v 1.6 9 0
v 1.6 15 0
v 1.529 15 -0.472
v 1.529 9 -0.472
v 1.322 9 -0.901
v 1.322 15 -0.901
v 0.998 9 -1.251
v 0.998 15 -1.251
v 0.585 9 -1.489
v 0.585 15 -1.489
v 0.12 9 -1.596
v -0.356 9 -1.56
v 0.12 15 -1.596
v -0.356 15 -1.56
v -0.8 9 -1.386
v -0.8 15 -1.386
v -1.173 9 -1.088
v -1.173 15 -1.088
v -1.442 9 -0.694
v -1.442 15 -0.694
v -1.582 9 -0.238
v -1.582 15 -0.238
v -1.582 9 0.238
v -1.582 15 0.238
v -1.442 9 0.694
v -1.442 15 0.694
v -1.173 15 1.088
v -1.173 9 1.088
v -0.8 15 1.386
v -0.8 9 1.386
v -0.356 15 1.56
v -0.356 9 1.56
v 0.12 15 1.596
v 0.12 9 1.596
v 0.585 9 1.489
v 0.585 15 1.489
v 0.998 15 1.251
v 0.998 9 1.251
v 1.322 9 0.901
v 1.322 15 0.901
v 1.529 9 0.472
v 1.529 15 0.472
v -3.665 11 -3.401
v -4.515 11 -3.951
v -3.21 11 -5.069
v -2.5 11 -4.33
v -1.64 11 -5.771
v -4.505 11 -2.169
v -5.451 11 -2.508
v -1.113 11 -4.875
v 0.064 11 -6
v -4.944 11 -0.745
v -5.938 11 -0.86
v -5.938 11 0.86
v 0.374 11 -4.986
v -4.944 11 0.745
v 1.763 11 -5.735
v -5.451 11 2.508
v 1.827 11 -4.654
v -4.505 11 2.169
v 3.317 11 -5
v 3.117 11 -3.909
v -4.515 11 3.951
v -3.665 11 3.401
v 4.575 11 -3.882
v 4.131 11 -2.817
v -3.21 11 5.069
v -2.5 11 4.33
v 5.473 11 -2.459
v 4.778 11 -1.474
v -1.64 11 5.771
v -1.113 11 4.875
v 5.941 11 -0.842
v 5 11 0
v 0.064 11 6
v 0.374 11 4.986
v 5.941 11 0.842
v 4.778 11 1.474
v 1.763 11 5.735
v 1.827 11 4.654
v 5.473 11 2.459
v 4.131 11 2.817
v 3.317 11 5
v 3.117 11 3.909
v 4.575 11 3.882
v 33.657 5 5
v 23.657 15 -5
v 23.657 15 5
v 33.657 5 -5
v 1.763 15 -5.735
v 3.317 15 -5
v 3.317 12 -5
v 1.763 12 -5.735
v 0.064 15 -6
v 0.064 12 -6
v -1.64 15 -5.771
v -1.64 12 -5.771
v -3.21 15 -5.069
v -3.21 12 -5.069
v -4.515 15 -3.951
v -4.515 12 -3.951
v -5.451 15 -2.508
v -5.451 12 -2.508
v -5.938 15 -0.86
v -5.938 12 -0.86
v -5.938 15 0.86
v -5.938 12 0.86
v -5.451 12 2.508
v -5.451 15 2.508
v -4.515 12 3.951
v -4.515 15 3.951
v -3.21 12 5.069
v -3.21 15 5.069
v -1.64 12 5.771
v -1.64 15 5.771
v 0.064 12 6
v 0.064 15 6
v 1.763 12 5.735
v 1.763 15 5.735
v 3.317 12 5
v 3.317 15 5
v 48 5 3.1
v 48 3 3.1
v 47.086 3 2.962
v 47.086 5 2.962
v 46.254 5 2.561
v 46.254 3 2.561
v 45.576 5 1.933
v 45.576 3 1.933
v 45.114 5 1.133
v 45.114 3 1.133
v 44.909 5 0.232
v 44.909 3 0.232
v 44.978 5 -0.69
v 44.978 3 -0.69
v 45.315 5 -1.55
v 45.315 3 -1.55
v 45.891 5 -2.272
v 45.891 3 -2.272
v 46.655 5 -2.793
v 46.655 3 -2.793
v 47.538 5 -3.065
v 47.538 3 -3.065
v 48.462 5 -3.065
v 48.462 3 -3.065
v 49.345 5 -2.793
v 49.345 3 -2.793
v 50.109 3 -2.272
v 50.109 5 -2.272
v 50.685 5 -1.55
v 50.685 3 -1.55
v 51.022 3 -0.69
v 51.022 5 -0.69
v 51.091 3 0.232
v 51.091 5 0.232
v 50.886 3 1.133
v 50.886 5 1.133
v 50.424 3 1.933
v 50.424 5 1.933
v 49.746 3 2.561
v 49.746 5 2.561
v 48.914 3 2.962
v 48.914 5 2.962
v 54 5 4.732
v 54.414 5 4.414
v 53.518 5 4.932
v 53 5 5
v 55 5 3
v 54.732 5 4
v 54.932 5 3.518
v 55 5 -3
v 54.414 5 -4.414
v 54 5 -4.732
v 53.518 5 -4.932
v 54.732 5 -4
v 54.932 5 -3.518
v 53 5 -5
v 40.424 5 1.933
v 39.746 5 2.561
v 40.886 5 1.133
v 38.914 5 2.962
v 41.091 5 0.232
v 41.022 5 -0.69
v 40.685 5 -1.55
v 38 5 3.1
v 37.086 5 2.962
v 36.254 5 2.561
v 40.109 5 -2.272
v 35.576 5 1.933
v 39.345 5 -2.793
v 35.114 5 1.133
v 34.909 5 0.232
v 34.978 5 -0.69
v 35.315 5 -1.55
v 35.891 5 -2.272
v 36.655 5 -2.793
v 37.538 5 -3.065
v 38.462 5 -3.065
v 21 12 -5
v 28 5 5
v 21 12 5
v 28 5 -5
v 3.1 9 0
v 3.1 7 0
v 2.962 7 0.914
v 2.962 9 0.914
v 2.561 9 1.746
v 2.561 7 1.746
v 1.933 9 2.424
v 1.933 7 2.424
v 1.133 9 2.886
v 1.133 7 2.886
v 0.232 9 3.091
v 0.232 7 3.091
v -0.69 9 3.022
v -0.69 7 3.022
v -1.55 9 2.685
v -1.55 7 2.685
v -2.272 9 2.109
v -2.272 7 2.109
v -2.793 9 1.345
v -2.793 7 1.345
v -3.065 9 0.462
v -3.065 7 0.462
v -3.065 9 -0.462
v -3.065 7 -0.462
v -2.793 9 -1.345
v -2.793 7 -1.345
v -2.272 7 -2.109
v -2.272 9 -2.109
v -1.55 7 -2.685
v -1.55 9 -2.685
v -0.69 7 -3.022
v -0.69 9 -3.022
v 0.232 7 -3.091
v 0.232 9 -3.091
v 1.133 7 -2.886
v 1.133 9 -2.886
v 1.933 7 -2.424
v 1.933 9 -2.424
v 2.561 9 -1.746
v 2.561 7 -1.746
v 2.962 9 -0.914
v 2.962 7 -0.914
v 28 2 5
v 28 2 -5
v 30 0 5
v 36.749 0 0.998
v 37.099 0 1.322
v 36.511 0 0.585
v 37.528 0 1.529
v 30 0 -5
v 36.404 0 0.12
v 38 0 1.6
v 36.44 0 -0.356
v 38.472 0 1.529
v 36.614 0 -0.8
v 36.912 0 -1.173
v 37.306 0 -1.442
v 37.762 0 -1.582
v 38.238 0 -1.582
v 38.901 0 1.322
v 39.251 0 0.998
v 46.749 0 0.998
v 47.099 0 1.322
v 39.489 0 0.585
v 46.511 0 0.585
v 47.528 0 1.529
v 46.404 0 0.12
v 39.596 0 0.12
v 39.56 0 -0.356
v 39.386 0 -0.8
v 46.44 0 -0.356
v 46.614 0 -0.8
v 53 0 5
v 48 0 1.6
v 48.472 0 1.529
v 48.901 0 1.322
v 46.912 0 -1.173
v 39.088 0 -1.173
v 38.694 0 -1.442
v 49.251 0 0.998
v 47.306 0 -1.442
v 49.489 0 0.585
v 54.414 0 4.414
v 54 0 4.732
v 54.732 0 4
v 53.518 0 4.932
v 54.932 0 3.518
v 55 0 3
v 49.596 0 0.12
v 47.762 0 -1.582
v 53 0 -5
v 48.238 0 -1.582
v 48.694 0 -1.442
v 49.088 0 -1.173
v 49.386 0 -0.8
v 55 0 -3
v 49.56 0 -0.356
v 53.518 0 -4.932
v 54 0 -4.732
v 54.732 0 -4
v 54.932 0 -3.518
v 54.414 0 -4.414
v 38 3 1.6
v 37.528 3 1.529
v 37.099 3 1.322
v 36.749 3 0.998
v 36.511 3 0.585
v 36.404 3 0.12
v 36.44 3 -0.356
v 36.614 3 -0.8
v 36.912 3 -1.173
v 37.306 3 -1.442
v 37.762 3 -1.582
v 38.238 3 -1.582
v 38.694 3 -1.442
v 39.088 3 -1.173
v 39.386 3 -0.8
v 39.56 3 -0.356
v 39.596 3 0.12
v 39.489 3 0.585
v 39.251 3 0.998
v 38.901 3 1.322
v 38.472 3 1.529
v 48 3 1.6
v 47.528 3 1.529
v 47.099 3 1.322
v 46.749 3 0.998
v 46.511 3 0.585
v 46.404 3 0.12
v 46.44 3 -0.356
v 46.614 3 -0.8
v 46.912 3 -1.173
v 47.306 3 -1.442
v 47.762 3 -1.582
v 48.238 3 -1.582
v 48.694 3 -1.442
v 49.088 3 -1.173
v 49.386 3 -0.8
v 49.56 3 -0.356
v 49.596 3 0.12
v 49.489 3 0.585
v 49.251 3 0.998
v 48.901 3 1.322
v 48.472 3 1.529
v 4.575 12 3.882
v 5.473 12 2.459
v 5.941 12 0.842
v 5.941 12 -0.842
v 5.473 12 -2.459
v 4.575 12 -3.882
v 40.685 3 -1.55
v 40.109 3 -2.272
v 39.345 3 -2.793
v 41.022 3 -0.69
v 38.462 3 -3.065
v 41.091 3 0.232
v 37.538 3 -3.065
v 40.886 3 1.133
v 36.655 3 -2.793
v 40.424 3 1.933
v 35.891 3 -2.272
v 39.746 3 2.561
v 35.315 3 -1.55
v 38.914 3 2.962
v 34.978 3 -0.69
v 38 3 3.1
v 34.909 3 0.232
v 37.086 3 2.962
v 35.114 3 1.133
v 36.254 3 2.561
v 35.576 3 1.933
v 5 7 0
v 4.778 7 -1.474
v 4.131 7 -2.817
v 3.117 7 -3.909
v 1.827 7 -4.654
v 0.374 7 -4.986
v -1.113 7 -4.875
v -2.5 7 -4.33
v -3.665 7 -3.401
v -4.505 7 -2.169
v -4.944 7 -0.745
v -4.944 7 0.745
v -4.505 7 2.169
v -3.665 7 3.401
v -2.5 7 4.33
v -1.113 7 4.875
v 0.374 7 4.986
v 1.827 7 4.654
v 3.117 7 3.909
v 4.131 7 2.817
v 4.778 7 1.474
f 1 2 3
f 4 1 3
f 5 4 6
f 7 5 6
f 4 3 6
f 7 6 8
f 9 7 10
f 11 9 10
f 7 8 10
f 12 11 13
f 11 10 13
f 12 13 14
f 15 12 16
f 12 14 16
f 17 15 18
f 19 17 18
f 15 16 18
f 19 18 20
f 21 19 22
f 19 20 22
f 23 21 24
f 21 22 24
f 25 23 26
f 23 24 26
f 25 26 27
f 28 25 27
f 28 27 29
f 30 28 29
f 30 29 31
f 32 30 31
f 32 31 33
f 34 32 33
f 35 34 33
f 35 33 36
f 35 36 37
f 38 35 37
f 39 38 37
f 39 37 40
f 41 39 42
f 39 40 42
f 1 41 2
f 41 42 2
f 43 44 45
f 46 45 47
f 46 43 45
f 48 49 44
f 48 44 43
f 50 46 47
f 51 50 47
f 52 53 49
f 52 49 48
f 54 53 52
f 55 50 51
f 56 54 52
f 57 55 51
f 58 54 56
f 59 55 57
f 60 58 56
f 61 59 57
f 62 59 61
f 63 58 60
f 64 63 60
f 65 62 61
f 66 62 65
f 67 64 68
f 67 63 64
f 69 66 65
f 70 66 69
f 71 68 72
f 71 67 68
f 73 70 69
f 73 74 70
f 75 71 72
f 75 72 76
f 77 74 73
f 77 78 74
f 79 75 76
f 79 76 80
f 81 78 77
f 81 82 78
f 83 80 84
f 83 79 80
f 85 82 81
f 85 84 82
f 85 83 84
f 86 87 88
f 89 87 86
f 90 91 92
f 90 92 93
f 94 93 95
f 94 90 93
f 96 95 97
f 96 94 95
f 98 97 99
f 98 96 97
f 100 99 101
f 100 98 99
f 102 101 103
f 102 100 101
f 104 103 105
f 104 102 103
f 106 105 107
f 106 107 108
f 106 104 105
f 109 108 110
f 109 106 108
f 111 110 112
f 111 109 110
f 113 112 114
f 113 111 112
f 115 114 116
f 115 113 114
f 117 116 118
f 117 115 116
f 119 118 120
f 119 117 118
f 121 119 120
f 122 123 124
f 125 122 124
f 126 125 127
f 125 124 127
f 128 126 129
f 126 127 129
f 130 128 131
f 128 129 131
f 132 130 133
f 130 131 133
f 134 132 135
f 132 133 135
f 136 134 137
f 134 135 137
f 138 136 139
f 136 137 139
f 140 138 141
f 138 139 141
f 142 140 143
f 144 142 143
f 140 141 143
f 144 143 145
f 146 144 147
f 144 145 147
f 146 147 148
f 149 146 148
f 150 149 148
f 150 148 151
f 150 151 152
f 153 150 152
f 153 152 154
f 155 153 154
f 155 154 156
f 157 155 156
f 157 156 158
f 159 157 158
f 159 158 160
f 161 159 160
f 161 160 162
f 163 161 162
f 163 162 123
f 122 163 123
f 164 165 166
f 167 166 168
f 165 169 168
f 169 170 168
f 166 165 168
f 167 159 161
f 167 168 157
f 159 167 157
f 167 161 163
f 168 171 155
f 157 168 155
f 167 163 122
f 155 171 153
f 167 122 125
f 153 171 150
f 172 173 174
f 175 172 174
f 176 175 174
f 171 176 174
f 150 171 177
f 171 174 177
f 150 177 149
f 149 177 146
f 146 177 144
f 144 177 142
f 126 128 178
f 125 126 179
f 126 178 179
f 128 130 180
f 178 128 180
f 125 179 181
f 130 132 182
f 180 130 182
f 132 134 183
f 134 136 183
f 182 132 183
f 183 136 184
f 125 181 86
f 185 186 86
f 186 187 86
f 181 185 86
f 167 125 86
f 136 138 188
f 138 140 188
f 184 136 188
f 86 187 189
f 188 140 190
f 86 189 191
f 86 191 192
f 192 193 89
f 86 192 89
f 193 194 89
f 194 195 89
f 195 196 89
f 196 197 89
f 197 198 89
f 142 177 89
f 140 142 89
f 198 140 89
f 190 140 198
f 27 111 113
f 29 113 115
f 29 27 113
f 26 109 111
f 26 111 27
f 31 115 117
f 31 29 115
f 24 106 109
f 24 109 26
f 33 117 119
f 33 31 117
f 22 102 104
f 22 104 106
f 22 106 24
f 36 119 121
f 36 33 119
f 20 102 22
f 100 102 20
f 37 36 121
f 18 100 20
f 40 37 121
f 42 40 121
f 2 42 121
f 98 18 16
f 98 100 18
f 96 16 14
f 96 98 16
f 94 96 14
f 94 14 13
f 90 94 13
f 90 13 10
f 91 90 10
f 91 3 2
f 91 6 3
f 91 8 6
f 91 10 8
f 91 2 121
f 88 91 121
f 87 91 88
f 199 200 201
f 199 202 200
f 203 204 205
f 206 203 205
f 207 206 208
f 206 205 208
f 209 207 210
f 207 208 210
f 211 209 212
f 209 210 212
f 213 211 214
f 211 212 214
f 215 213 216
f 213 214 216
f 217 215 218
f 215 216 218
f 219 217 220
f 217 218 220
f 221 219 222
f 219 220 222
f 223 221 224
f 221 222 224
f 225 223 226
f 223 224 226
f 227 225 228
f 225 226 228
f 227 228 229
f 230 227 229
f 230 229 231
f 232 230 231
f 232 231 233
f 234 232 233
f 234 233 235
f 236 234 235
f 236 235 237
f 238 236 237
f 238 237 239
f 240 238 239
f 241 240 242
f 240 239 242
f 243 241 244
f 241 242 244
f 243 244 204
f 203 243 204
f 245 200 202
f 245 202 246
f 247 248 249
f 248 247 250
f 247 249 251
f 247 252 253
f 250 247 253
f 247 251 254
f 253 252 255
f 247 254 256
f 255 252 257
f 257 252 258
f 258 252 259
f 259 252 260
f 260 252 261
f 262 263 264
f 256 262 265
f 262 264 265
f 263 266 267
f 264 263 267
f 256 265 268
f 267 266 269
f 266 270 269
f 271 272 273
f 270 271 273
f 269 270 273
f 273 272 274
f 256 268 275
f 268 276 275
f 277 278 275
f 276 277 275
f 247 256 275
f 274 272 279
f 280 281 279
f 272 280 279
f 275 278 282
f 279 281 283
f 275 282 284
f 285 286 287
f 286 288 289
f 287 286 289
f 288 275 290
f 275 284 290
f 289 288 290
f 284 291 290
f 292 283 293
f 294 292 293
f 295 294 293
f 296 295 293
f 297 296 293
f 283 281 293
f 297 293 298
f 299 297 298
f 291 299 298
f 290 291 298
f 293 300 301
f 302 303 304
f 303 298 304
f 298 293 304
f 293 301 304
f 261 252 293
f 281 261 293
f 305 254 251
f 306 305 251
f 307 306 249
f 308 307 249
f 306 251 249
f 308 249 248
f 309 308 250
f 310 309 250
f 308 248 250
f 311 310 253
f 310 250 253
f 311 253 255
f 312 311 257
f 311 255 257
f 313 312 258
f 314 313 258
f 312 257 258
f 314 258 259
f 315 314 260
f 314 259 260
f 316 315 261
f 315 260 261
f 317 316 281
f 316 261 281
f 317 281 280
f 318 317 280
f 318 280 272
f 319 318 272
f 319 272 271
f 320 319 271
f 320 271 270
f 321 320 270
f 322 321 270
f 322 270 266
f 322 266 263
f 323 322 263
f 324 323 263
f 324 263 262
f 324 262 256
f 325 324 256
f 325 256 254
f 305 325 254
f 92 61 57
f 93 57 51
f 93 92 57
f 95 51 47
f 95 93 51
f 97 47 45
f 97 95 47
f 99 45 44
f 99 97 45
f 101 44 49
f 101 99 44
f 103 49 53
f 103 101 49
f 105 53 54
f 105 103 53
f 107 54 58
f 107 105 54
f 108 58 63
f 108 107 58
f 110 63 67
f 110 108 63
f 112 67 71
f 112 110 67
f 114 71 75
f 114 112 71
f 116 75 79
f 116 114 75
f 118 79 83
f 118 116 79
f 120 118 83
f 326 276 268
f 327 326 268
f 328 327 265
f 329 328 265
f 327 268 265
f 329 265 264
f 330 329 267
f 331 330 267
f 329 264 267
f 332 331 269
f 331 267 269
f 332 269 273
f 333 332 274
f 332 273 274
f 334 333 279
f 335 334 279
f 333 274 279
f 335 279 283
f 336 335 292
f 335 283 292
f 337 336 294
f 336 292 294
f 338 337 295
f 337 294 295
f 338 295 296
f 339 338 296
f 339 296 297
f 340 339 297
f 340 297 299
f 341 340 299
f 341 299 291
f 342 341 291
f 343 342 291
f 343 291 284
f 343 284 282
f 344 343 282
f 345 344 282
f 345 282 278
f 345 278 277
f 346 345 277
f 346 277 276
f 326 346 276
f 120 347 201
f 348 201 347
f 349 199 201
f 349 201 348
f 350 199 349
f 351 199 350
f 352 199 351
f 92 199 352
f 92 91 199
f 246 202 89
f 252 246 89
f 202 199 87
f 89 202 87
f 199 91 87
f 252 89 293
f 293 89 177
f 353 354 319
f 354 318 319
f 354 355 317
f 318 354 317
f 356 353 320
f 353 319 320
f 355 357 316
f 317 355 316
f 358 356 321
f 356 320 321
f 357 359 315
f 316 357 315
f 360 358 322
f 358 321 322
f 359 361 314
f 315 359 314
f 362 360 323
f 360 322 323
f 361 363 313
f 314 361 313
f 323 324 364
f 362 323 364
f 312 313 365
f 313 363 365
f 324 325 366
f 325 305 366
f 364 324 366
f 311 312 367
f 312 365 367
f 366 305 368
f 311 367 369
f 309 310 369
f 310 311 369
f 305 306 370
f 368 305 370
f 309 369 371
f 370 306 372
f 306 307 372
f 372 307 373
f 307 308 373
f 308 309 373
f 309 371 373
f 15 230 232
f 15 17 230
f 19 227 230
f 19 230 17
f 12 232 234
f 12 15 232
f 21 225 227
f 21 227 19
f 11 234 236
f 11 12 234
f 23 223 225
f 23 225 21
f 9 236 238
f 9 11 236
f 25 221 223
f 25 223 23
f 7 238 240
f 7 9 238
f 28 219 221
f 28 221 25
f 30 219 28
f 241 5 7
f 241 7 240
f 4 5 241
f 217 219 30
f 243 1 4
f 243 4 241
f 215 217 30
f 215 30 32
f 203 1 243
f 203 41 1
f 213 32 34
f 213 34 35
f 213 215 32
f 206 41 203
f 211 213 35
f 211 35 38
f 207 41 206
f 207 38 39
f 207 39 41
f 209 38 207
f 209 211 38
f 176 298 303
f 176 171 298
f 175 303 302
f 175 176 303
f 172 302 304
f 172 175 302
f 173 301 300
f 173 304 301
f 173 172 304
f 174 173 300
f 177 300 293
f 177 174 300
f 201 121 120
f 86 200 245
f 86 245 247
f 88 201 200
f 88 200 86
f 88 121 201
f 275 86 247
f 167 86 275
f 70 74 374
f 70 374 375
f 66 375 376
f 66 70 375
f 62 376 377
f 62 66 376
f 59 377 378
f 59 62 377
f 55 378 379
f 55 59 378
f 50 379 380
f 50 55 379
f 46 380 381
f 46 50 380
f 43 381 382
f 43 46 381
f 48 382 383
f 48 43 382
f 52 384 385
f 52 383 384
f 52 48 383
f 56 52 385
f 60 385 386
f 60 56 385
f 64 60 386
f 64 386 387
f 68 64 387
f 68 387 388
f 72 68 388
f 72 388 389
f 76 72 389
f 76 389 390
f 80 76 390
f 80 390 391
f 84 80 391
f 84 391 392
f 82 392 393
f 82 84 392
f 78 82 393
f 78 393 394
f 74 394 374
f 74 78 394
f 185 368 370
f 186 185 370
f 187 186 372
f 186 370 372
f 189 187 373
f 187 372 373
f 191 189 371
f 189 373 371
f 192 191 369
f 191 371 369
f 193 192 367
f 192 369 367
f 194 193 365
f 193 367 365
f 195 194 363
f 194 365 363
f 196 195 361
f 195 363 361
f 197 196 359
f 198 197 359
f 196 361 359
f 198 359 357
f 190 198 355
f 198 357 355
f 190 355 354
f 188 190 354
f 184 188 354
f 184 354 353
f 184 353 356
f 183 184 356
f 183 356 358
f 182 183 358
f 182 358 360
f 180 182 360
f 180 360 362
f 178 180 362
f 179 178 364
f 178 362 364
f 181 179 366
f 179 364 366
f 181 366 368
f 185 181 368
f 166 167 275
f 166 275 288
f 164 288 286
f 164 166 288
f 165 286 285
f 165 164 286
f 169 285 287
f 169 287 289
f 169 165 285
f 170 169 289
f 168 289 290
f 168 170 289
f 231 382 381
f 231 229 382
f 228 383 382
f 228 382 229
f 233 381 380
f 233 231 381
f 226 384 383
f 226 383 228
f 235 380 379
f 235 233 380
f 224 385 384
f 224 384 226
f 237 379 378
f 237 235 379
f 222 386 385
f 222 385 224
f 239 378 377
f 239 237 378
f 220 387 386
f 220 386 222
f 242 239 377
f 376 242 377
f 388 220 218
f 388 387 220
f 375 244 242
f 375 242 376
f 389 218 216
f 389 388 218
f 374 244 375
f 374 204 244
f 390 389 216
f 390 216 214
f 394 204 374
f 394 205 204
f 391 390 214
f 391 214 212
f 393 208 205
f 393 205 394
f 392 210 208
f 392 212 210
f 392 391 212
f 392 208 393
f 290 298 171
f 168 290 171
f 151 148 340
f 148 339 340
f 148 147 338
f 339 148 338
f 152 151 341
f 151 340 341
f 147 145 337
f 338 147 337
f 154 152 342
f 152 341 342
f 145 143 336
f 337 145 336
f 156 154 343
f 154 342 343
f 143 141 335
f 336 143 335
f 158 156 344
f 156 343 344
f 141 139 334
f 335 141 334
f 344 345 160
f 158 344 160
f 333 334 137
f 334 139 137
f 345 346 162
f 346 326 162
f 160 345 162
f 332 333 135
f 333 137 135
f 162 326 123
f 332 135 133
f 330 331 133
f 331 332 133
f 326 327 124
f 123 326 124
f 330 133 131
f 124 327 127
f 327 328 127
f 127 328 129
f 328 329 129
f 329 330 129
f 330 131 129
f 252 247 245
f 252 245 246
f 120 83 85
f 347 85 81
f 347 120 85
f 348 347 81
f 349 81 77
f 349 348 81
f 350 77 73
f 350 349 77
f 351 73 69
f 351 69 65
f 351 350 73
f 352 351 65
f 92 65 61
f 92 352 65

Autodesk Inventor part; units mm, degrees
ref_plane "YZ Plane" through (0, 0, 0) normal (1, 0, 0) x (0, 1, 0)
ref_plane "XZ Plane" through (0, 0, 0) normal (0, 1, 0) x (-1, 0, 0)
ref_plane "XY Plane" through (0, 0, 0) normal (0, 0, 1) x (1, 0, 0)
sketch "Sketch1" plane through (0, 0, 0) normal (0, 0, 1) x (1, 0, 0)
  line L0 (0, 0) -> (0, 15)
  line L1 (0, 15) -> (23.6569, 15)
  line L2 (21, 12) -> (0, 12)
  line L3 (0, 12) -> (0, 15)
  line L4 (28, 0) -> (55, 0)
  line L5 (55, 0) -> (55, 5)
  line L6 (55, 5) -> (28, 5)
  line L7 (28, 5) -> (28, 0)
  line L8 (28, 5) -> (21, 12)
  line L9 (23.6569, 15) -> (33.6569, 5)
  dimension "d0" = 135
  dimension "d1" = 5
  dimension "d2" = 28
  dimension "d3" = 3
  dimension "d4" = 4
  dimension "d5" = 12
  dimension "d6" = 55
extrude "Extrusion1" add sketch "Sketch1" along normal mid plane 10
sketch "Sketch3" plane through (33.6569, 5, 5) normal (0, 1, 0) x (1, 0, 0)
  line L0 (21.3431, 10) -> (21.3431, 0) projected
  line L1 (21.3431, 5) -> (-0.1629, 5) construction
  line L2 (-33.6569, 0) -> (-33.6569, 10) projected
  point P0 (-33.6569, 5)
  point P1 (14.3431, 5)
  point P2 (4.3431, 5)
  dimension "d9" = 10
  dimension "d18" = 38
hole "Hole1" at (48, 5, 0) at (38, 5, 0) direction (0, -1, 0) diameter 3.2 end through all counterbore diameter 6.2 counterbore depth 2
chamfer "Chamfer1" distance 2 angle 45 1 edges at (28, 0, 0)
sketch "Sketch4" plane through (0, 15, 5) normal (0, 1, 0) x (1, 0, 0)
  circle A0 centre (0, 5) radius 6
  dimension "d22" = 12
extrude "Extrusion2" add sketch "Sketch4" against normal up to surface (3 mm away)
sketch "Sketch5" plane through (21, 12, -5) normal (0, -1, 0) x (1, 0, 0)
  circle A0 centre (-21, 5) radius 6
  arc A1 (-17.6834, 10) -> (-17.6834, 0) centre (-21, 5) ccw projected
extrude "Extrusion3" add sketch "Sketch5" along normal blind 1
sketch "Sketch6" plane through (0, 11, 0) normal (0, -1, 0) x (1, 0, 0)
  circle A0 centre (0, 0) radius 5
  point P0 (0, 0)
  dimension "d27" = 10
extrude "Extrusion4" add sketch "Sketch6" along normal blind 4
sketch "Sketch7" plane through (0, 7, 0) normal (0, -1, 0) x (1, 0, 0)
  circle A0 centre (0, 0) radius 3.1
  point P0 (0, 0)
  dimension "d30" = 6.2
extrude "Extrusion5" cut sketch "Sketch7" against normal blind 2
sketch "Sketch8" plane through (23.6569, 15, 5) normal (0, 1, 0) x (1, 0, 0)
  circle A0 centre (-23.6569, 5) radius 1.6
  dimension "d33" = 3.2
extrude "Extrusion6" cut sketch "Sketch8" against normal through all
chamfer "Chamfer2" [suppressed]
fillet "Fillet1" radius 2 2 edges at (55, 2.5, 5) (55, 2.5, -5)
properties part number "joint mag"
